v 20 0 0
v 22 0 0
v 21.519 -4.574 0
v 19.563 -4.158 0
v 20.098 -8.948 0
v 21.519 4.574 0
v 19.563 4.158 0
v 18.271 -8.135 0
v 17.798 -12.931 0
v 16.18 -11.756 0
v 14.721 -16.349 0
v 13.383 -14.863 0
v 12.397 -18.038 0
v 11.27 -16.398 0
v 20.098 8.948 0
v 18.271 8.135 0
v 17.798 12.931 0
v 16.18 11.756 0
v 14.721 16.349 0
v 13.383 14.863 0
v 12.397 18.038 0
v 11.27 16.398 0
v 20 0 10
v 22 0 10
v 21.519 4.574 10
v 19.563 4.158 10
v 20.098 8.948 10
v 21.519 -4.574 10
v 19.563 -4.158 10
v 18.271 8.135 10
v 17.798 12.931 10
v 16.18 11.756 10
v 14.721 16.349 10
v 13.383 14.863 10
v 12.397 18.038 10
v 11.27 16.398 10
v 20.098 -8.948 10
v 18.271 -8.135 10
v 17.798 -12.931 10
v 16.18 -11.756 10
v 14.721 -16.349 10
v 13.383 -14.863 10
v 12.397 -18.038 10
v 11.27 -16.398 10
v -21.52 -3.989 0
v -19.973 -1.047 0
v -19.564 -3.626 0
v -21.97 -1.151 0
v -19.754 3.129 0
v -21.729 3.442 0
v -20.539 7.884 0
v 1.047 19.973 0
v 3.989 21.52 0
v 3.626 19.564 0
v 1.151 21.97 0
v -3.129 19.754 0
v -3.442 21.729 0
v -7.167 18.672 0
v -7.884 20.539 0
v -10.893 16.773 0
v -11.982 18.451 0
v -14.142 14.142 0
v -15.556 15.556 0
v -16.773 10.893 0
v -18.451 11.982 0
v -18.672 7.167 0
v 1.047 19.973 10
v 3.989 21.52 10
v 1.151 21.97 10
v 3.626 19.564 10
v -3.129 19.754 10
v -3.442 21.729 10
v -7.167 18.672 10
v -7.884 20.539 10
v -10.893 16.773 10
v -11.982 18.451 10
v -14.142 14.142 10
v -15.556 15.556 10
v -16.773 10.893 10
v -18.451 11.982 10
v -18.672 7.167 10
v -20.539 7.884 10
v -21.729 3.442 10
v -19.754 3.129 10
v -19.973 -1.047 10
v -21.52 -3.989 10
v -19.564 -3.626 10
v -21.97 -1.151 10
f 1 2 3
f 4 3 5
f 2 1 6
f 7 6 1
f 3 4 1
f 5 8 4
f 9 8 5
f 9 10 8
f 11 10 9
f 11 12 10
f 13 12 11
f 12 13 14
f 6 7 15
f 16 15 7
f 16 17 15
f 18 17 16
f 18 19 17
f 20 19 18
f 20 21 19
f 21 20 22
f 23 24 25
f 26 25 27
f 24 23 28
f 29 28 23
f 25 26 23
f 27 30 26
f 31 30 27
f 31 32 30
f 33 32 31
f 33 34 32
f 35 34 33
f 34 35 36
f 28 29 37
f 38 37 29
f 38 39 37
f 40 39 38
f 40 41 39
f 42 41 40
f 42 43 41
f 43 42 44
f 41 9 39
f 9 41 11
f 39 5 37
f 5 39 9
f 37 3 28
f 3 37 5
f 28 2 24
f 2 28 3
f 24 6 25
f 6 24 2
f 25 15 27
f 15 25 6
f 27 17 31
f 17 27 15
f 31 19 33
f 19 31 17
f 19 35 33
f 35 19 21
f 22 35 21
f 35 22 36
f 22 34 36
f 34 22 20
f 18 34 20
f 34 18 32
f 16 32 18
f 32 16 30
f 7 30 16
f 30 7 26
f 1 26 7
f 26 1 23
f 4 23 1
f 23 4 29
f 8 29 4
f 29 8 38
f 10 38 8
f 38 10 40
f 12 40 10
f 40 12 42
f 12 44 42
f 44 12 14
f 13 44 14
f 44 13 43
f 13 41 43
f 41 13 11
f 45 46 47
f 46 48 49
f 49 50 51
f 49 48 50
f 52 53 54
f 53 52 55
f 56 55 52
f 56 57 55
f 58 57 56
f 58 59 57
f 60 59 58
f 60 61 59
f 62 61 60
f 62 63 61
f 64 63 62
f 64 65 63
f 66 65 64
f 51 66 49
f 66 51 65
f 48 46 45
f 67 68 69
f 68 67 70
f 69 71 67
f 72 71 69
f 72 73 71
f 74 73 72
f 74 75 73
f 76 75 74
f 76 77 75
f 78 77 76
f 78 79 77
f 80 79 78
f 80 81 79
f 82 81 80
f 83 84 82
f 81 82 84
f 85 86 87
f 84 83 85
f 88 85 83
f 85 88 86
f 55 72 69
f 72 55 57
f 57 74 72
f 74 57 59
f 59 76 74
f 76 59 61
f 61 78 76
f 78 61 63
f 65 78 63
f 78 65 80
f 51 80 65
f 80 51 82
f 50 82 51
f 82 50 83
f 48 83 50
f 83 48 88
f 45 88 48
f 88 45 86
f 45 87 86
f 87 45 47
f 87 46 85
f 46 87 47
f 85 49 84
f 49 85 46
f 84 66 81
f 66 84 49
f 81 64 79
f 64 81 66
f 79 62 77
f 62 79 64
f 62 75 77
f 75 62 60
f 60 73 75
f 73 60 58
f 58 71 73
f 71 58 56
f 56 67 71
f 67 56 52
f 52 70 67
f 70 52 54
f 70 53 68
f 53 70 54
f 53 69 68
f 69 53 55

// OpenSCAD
// file: ../../../../../external-resources/geometry/arc/chickenchuck040/arc.scad
// This arc module is from this thing on Thingiverse:
//		https://www.thingiverse.com/thing:1092611

module arc(radius, thick, angle)
{
	intersection()
	{
		union()
		{
			rights = floor(angle/90);
			remain = angle-rights*90;
			if(angle > 90)
			{
				for(i = [0:rights-1]){
					rotate(i*90-(rights-1)*90/2){
						polygon([[0, 0], [radius+thick, (radius+thick)*tan(90/2)], [radius+thick, -(radius+thick)*tan(90/2)]]);
					}
				}
				rotate(-(rights)*90/2)
					polygon([[0, 0], [radius+thick, 0], [radius+thick, -(radius+thick)*tan(remain/2)]]);
				rotate((rights)*90/2)
					polygon([[0, 0], [radius+thick, (radius+thick)*tan(remain/2)], [radius+thick, 0]]);
			}
			else
			{
				polygon([[0, 0], [radius+thick, (radius+thick)*tan(angle/2)], [radius+thick, -(radius+thick)*tan(angle/2)]]);
			}
		}
		difference(){
			circle(radius+thick);
			circle(radius);
		}
	}
}

//arc(10, 3, 300);
// file: ../extruded-arc.scad
use <../../../../external-resources/geometry/arc/chickenchuck040/arc.scad>

module rectangularArc(radius, radiusExtension, angle, height)
{
    linear_extrude(height = height)
    arc(radius = radius,
        thick = radiusExtension,
        angle = angle);
}
// main file
use <../extruded-arc.scad>

radius = 20;
radiusExtension = 2;
angle = 111;
height = 10;

color("orange")
rectangularArc(radius = radius, 
               radiusExtension = radiusExtension, 
               angle = angle, 
               height = height);


color("blue")
rotate([0, 0, 135])
rectangularArc(radius = radius, 
               radiusExtension = radiusExtension, 
               angle = -angle, 
               height = height);
